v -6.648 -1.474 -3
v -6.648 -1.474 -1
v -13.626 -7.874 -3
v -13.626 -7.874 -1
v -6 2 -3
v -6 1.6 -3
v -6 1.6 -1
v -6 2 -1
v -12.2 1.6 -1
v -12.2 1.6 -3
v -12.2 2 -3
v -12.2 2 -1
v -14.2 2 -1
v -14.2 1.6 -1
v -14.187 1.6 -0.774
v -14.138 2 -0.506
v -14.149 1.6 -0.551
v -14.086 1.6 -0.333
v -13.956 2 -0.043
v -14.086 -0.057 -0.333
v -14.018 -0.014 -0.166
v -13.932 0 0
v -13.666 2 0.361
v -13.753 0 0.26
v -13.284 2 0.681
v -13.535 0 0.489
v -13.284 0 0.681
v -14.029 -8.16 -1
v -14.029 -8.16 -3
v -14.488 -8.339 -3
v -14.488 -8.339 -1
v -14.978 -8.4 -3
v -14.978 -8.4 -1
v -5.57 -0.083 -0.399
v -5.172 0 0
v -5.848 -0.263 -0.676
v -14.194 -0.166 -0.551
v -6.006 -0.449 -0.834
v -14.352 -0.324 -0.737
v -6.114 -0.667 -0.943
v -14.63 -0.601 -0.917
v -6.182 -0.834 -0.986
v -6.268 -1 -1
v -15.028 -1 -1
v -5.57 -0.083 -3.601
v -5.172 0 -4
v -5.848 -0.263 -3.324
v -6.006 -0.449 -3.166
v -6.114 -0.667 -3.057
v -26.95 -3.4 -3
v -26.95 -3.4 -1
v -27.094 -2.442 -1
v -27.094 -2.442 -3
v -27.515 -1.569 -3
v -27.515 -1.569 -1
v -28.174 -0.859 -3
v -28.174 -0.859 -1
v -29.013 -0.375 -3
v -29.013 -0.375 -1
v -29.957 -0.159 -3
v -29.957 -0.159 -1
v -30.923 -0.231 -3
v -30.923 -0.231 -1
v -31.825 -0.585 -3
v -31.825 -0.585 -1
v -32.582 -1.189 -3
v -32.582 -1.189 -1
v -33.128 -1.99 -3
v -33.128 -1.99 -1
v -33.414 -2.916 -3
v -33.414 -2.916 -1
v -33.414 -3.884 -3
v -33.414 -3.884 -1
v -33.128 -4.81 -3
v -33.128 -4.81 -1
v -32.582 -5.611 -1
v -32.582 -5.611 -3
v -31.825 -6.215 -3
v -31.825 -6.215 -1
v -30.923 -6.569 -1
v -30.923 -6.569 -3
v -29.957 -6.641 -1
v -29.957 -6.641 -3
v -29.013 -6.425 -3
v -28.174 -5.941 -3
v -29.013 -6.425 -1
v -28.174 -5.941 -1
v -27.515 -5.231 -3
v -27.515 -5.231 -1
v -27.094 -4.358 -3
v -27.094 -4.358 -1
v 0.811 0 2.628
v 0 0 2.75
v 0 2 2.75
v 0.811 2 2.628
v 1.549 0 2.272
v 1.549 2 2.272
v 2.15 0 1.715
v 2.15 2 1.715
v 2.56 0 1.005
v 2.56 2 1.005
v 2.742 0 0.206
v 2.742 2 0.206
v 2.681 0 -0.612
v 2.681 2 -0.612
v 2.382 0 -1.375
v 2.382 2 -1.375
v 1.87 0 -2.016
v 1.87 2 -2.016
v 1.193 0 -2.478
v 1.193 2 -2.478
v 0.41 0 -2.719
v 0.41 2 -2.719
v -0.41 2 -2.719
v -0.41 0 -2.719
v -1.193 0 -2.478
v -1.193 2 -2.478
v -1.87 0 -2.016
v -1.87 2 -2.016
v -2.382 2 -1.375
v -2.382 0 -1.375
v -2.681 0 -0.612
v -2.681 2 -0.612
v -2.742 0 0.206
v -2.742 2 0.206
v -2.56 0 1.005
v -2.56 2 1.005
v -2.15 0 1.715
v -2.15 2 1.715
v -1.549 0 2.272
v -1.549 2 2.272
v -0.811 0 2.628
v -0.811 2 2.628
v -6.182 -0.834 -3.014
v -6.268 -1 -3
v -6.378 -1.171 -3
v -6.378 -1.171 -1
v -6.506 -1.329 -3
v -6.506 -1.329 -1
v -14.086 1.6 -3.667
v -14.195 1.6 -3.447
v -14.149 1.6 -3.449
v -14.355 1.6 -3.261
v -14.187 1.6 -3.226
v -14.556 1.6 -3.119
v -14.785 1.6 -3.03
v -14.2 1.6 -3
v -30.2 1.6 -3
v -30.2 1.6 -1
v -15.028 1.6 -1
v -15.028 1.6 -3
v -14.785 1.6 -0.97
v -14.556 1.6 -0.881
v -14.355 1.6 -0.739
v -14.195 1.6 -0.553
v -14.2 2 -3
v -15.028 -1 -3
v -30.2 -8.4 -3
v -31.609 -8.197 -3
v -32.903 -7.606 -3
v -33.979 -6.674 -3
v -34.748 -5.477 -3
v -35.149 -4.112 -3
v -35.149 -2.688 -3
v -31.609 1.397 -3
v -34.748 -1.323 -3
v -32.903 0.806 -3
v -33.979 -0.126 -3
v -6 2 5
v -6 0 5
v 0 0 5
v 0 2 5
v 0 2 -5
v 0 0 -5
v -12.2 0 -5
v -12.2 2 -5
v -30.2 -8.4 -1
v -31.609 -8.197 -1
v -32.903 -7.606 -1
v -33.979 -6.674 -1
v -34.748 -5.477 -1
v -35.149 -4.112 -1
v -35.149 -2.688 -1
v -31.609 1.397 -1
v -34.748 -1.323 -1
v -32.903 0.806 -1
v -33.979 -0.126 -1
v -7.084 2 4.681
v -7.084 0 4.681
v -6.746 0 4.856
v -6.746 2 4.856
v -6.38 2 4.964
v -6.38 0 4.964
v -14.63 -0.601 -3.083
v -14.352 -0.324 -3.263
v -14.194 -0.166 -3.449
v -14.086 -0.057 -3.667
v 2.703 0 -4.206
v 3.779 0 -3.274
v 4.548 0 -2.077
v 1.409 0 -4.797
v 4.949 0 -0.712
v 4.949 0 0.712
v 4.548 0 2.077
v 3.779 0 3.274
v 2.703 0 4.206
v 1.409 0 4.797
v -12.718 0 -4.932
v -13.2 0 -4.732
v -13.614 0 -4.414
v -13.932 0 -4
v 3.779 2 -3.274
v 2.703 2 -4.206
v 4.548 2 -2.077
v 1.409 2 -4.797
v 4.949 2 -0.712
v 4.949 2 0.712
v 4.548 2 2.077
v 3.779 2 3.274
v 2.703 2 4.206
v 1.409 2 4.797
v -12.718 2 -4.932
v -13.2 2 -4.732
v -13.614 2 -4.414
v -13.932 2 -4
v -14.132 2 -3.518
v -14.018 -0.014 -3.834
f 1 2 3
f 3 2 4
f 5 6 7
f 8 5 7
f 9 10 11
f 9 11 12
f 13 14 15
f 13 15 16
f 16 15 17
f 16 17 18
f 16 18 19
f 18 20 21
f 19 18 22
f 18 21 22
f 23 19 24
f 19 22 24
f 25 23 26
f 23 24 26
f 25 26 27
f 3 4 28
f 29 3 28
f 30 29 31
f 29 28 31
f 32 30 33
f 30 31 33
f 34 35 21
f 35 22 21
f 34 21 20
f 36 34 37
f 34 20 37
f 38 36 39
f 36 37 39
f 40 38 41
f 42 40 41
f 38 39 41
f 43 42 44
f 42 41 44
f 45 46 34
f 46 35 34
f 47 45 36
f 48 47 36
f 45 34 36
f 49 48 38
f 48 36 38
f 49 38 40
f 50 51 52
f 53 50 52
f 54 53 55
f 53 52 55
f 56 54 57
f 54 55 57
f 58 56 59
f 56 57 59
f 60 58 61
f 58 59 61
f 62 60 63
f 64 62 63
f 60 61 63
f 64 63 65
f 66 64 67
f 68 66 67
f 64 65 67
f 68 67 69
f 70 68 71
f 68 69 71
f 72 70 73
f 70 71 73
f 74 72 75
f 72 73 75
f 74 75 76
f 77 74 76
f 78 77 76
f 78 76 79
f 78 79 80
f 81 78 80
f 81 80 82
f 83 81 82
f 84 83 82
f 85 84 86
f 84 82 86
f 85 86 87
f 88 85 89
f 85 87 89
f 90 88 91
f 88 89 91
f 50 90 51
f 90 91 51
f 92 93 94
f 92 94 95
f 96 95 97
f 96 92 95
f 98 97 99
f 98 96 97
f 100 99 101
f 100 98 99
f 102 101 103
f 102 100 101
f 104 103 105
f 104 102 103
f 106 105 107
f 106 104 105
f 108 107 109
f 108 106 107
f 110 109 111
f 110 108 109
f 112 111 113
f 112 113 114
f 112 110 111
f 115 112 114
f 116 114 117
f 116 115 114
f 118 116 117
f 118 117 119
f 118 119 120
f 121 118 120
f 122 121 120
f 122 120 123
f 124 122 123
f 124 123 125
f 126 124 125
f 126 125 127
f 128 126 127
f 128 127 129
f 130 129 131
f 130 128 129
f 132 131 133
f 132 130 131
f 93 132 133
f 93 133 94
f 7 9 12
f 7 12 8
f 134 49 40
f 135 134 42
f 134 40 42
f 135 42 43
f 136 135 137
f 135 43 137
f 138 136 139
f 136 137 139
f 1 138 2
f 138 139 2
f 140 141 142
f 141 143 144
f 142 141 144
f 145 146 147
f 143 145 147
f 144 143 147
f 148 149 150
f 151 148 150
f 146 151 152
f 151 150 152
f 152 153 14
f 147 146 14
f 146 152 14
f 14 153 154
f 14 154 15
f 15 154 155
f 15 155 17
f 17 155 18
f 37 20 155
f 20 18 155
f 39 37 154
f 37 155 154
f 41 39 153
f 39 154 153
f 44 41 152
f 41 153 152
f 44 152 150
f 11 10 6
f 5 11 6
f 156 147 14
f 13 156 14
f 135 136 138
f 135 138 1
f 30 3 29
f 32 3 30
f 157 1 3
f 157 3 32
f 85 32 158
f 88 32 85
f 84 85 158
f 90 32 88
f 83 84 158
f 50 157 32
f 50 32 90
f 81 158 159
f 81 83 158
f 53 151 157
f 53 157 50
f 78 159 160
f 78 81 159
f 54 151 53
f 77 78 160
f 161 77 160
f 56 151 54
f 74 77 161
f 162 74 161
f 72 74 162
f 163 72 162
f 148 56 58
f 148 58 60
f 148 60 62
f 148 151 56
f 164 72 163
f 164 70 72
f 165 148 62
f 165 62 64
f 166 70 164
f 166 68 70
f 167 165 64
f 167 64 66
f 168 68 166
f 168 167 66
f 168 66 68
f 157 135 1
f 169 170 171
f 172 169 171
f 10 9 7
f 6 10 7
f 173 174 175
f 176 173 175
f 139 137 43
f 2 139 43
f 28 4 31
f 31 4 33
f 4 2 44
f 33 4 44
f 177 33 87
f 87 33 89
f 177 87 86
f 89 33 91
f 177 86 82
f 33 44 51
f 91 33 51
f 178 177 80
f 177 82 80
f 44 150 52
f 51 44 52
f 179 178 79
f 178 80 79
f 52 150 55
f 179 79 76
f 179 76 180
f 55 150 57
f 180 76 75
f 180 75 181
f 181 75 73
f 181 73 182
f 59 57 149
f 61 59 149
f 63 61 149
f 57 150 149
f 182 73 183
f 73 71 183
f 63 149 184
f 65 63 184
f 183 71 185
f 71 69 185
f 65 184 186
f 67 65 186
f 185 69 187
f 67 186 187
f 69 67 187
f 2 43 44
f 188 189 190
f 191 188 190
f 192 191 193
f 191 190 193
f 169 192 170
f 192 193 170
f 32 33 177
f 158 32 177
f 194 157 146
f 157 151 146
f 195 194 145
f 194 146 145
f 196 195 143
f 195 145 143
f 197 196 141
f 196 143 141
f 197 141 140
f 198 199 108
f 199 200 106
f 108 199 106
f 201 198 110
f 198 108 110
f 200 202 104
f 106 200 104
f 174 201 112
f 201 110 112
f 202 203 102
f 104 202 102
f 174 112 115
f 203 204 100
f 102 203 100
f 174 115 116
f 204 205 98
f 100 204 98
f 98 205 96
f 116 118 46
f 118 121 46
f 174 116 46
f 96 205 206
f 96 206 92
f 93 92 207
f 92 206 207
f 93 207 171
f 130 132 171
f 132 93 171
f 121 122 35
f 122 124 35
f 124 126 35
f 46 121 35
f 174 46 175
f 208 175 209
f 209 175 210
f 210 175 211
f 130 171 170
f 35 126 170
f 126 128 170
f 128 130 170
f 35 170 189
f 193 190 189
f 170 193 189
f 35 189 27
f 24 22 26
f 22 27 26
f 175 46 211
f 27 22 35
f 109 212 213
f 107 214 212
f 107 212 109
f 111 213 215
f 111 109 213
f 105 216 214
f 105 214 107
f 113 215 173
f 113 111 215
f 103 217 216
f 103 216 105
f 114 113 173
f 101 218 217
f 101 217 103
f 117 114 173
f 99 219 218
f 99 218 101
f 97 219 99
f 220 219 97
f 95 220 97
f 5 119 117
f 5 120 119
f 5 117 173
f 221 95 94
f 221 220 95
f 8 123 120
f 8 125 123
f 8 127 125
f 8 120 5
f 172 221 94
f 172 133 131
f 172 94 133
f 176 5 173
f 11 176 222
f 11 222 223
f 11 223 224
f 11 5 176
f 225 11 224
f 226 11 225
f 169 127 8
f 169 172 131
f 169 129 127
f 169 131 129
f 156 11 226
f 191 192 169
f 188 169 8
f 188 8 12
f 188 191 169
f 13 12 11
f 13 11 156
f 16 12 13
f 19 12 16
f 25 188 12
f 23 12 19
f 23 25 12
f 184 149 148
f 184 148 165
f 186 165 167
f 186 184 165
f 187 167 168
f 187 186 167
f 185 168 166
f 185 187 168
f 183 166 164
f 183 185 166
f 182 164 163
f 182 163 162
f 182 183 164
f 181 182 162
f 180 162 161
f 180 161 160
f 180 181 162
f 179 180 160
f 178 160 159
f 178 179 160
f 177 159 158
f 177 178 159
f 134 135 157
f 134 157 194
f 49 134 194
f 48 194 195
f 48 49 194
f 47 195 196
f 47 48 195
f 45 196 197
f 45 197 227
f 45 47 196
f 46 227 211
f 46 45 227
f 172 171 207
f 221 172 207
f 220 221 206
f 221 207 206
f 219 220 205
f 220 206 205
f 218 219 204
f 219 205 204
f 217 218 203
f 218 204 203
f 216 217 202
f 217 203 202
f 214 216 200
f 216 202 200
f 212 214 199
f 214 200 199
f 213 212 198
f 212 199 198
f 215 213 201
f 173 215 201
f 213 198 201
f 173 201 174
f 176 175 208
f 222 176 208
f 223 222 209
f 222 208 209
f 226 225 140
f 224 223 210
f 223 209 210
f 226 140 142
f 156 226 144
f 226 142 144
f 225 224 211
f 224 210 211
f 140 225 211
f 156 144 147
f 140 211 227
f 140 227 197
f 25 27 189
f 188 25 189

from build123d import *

# Parameters (mm, degrees)
SKETCH12_R          = 2.75
BOSS_EXTRUDE5_DEPTH = 2
BOSS_EXTRUDE6_START = -1
SKETCH20_R          = 3.25
BOSS_EXTRUDE6_DEPTH = 2
SKETCH21_W          = 6.2
SKETCH21_H          = 2
BOSS_EXTRUDE7_DEPTH = 2
BOSS_EXTRUDE8_DEPTH = 2
FILLET1_R           = 1


with BuildPart() as part:
    # Sketch12 → Boss-Extrude5 (new body)
    with BuildSketch(Plane(origin=(0, 0, 0), x_dir=(1, 0, 0), z_dir=(0, 1, 0))):
        with BuildLine():
            Line((0, 5), (-5, 5))
            Line((-5, 5), (-5, -5))
            Line((-5, -5), (0, -5))
            ThreePointArc((0, -5), (5, 0), (0, 5))
        make_face()
        with Locations(Location((0, 0, 0), (0, 0, 270))):
            Circle(SKETCH12_R, mode=Mode.SUBTRACT)
    extrude(amount=BOSS_EXTRUDE5_DEPTH)

    # Sketch21 → Boss-Extrude7 (add)
    with BuildSketch(Plane.XZ):
        with BuildLine():
            Line((-5, -5), (-6, -5))
            Line((-6, -5), (-12.2, -5))
            ThreePointArc((-12.2, -5), (-13.614213562, -4.414213562), (-14.2, -3))
            Line((-14.2, -3), (-14.2, -1))
            ThreePointArc((-14.2, -1), (-13.956204356, -0.043053679), (-13.28425374, 0.680593296))
            Line((-13.28425374, 0.680593296), (-7.08425374, 4.680593296))
            ThreePointArc((-7.08425374, 4.680593296), (-6.565160777, 4.918487242), (-6, 5))
            Line((-6, 5), (-5, 5))
            Line((-5, 5), (-5, -5))
        make_face()
        with Locations((-9.1, -2)):
            Rectangle(SKETCH21_W, SKETCH21_H, mode=Mode.SUBTRACT)
    extrude(amount=-BOSS_EXTRUDE7_DEPTH)



with BuildPart() as body_2:
    # Sketch20 → Boss-Extrude6 (new body)
    with BuildSketch(Plane.XY.offset(BOSS_EXTRUDE6_START)):
        with BuildLine():
            Line((-15.2, -8.4), (-15.2, 1.6))
            Line((-15.2, 1.6), (-30.2, 1.6))
            ThreePointArc((-30.2, 1.6), (-35.2, -3.4), (-30.2, -8.4))
            Line((-30.2, -8.4), (-15.2, -8.4))
        make_face()
        with Locations((-30.2, -3.4)):
            Circle(SKETCH20_R, mode=Mode.SUBTRACT)
    extrude(amount=-BOSS_EXTRUDE6_DEPTH)


with BuildPart() as part_1:
    add(part.part)

    add(body_2.part)  # Boss-Extrude8 merges body 2
    # Sketch22 → Boss-Extrude8 (add)
    with BuildSketch(Plane.XY.offset(-1)):
        with BuildLine():
            Line((-6.648176396, -1.473965041), (-13.626436158, -7.873965041))
            ThreePointArc((-13.626436158, -7.873965041), (-14.252977088, -8.26385757), (-14.978259763, -8.4))
            Line((-14.978259763, -8.4), (-15.2, -8.4))
            Line((-15.2, -8.4), (-15.2, 1.6))
            Line((-15.2, 1.6), (-6, 1.6))
            Line((-6, 1.6), (-6, 0))
            ThreePointArc((-6, 0), (-6.169201375, -0.805094029), (-6.648176396, -1.473965041))
        make_face()
    extrude(amount=-BOSS_EXTRUDE8_DEPTH)

    # Fillet1
    fillet1_edges = [part_1.edges().sort_by_distance(p)[0] for p in [
        (-6, 0, -2),
        (-14.2, 0.8, -1),
        (-14.2, 0.8, -3),
        (-10.1, 0, -3),
        (-10.1, 0, -1),
    ]]
    fillet(fillet1_edges, radius=FILLET1_R)


solid = part_1.part
